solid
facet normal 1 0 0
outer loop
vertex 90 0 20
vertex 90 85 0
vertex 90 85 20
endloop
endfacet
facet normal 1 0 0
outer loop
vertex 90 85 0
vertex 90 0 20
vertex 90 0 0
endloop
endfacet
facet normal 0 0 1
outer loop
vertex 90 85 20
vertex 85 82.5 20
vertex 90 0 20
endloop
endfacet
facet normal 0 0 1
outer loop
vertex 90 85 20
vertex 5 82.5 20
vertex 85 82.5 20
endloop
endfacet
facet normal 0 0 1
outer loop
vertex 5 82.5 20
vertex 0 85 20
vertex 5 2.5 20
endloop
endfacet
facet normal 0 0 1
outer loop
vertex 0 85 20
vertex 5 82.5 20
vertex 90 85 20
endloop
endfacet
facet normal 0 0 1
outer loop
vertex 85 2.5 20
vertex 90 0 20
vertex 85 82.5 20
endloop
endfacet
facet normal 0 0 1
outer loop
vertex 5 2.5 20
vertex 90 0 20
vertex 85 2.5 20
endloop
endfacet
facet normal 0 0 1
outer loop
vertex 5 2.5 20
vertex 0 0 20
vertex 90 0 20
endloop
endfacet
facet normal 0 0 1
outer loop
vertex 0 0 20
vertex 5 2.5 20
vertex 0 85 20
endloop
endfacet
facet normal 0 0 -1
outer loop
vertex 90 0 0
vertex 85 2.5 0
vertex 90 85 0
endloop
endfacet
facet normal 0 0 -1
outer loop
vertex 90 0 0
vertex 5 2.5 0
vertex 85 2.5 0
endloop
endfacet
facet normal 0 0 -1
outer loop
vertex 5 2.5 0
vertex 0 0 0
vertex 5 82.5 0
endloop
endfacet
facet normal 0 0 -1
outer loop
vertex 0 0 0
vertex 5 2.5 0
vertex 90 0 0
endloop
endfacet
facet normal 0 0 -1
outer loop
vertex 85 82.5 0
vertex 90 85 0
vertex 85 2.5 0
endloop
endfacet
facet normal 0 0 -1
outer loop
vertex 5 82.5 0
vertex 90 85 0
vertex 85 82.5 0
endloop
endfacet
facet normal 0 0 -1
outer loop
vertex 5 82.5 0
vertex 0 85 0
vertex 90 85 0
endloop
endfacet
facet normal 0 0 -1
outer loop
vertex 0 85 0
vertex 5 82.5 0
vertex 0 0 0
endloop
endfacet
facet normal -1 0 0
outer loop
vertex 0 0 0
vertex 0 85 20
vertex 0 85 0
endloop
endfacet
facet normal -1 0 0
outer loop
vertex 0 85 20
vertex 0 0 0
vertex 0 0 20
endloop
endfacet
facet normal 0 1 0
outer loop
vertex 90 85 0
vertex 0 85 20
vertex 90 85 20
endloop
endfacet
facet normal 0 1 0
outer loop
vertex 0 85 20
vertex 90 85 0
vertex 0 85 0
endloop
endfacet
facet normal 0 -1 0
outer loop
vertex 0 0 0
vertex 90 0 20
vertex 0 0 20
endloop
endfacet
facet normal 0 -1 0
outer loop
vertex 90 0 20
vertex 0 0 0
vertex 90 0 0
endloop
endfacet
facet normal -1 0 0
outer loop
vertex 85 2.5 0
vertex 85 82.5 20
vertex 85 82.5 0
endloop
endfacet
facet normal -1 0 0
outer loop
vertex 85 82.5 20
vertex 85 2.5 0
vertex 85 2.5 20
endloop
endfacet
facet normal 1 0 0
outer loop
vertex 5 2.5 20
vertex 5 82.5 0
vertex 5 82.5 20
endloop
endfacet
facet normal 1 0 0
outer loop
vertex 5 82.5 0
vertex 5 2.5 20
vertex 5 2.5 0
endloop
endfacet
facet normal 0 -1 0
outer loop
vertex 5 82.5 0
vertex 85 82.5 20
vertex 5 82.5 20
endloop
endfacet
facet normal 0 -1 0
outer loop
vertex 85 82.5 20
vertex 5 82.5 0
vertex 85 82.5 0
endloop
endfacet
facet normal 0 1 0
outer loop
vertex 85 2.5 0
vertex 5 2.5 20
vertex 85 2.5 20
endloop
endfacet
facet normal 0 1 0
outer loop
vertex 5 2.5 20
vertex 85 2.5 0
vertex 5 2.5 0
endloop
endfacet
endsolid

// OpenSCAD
//---------------------------------------------------------------------------------------------
//-- Print of Saw_Holder
//-- (c) Martin Korinek	m.ko@inode.at
//-- 2015
//---------------------------------------------------------------------------------------------
//--
//---------------------------------------------------------------------------------------------

use <MCAD/fonts.scad>

//fragment minimum angle
  $fa=10.0;

//fragment minimum size
  $fs=0.2;
  
  
  HolzBreite = 80.0;
  HolzLaenge = 80.0;
  HalterDicke = 5;
  HalterHoehe =20.0;
  PlattenBreite = 20.0;

difference()
{
	//cube([70,90,1],center = true);
	cube([HolzBreite+2*HalterDicke,HolzLaenge+HalterDicke,HalterHoehe]);
	translate([HalterDicke,HalterDicke/2,0])
    cube([HolzBreite,HolzLaenge,HalterHoehe]);
	
}
